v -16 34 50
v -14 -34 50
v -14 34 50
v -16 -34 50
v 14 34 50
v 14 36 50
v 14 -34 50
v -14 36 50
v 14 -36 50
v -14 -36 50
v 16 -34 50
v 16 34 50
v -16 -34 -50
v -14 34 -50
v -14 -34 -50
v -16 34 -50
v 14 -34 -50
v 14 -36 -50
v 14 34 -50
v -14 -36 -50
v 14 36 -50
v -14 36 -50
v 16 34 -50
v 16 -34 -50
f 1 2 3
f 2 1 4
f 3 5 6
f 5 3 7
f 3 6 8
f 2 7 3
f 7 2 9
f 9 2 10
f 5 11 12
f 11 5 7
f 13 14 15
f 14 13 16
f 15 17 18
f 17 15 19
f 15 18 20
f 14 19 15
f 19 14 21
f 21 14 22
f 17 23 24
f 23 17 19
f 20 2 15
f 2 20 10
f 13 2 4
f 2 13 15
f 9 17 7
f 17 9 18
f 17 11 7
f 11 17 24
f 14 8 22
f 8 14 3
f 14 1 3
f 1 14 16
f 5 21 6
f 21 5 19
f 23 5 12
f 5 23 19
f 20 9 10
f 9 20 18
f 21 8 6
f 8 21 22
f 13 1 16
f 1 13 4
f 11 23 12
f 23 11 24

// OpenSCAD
module aluminium_extrusion() {
    difference() {
        cube([40, 80, 100], center = true);
        translate([-18, -38, -50])
            cube([4, 4, 100]);
        translate([14, -38, -50])
            cube([4, 4, 100]);
        translate([-18, 34, -50])
            cube([4, 4, 100]);
        translate([14, 34, -50])
            cube([4, 4, 100]);
        translate([-20, -40, -50])
            cube([40, 4, 100]);
        translate([-20, 36, -50])
            cube([40, 4, 100]);
        translate([-20, -40, -50])
            cube([4, 80, 100]);
        translate([16, -40, -50])
            cube([4, 80, 100]);
    }
}

aluminium_extrusion();
